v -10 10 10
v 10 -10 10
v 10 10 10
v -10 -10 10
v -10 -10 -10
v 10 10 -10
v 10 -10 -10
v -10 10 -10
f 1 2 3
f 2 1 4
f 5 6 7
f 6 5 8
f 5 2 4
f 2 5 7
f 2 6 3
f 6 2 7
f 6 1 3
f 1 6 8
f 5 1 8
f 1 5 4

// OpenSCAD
// GCSC2 Test Fixture: Known-good manifold cube
// This should always pass mesh validation

cube([20, 20, 20], center=true);
